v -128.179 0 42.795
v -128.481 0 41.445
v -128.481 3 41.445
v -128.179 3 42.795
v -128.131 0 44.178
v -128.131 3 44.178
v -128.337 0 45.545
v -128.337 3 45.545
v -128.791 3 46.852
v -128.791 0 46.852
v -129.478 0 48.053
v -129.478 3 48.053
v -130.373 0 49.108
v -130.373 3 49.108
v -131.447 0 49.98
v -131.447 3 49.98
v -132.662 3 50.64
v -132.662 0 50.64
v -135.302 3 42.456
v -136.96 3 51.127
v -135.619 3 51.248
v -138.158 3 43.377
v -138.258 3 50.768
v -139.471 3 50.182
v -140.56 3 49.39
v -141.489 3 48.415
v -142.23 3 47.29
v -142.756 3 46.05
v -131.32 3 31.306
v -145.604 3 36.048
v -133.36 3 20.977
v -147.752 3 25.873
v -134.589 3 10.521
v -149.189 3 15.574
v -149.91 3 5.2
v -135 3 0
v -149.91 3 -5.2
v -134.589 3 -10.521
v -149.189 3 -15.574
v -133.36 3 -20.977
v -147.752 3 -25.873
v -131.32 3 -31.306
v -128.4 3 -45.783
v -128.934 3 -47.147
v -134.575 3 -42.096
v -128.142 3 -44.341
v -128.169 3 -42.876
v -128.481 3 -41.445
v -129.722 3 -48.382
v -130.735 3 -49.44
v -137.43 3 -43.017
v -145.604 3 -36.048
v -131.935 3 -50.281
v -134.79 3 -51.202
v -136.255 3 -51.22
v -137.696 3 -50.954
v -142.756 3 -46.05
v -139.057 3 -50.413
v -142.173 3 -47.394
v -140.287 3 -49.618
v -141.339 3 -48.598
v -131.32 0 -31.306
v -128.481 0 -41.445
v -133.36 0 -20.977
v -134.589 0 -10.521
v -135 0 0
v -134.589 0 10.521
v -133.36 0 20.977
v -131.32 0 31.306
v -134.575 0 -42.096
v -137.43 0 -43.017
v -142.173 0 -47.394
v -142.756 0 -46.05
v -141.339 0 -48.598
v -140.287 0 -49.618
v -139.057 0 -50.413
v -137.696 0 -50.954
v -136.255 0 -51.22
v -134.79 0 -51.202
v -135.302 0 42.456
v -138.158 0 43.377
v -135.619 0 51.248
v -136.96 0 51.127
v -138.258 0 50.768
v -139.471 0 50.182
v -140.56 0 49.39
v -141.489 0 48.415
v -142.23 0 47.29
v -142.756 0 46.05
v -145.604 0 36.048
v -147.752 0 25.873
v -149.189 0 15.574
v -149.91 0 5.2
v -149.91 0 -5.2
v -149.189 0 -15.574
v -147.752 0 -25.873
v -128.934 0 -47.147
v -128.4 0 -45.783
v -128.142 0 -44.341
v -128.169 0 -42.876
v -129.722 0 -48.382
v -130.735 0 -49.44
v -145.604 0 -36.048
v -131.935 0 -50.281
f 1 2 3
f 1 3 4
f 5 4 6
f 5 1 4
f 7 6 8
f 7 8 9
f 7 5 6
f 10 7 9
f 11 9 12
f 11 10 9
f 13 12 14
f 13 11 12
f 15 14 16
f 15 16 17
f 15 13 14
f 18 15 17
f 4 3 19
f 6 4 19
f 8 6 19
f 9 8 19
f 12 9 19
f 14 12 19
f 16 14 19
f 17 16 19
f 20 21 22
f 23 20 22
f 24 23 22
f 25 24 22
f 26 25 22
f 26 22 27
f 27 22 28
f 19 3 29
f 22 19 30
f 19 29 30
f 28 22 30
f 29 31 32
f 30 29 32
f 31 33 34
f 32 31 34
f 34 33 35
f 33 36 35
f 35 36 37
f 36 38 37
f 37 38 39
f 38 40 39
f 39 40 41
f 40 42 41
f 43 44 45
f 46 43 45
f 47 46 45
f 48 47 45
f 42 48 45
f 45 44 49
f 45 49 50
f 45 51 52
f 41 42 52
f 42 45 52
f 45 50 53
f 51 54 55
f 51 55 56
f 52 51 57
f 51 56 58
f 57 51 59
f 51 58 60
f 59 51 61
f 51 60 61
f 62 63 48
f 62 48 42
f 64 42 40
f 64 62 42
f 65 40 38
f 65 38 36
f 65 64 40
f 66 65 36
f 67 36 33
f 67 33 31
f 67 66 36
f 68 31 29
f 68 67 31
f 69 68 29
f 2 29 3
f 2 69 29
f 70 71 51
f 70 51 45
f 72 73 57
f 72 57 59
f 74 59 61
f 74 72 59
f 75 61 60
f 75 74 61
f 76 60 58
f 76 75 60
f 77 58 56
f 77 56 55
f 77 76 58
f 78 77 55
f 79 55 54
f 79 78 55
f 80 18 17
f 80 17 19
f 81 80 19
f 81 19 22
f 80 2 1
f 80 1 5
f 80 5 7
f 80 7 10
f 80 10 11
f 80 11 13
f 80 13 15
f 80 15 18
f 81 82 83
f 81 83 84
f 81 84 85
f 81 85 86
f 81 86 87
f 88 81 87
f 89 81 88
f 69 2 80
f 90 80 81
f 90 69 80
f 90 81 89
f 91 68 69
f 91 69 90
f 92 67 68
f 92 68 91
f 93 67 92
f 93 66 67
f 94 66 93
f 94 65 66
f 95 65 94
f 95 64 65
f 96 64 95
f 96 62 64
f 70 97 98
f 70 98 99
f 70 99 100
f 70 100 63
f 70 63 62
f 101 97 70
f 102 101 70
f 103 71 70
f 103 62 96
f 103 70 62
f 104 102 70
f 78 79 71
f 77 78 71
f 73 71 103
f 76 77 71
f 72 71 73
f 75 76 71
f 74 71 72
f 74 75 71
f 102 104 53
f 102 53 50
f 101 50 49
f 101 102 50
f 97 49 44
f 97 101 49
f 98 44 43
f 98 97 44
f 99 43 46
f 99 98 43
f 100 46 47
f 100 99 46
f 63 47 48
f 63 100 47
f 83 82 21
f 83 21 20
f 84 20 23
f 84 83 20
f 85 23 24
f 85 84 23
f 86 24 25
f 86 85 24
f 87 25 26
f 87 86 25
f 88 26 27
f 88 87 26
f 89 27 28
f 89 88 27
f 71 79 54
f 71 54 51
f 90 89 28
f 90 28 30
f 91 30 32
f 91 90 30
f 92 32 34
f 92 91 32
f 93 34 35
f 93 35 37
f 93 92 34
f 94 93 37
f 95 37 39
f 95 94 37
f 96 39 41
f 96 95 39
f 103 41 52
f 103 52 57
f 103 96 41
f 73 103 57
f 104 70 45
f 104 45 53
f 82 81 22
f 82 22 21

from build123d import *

# Parameters (mm, degrees)
SALIENTE_EXTRUIR1_DEPTH = 3


with BuildPart() as part:
    # Croquis2 → Saliente-Extruir1 (new body)
    with BuildSketch(Plane(origin=(0, 0, 0), x_dir=(1, 0, 0), z_dir=(0, 1, 0))):
        with BuildLine():
            Line((-134.790190036, 51.201608082), (-137.430390036, 43.016906257))
            Line((-137.430390036, 43.016906257), (-134.575261492, 42.095906257))
            Line((-134.575261492, 42.095906257), (-131.935061492, 50.280608082))
            ThreePointArc((-131.935061492, 50.280608082), (-128.633444304, 46.478345774), (-128.480784458, 41.445))
            ThreePointArc((-128.480784458, 41.445), (-135, 0), (-128.480784458, -41.445))
            ThreePointArc((-128.480784458, -41.445), (-128.791366857, -46.852143005), (-132.662267215, -50.640254317))
            Line((-132.662267215, -50.640254317), (-135.302467215, -42.455552492))
            Line((-135.302467215, -42.455552492), (-138.157595759, -43.376552492))
            Line((-138.157595759, -43.376552492), (-135.618605817, -51.2475))
            ThreePointArc((-135.618605817, -51.2475), (-140.033424613, -49.810451014), (-142.756427176, -46.05))
            ThreePointArc((-142.756427176, -46.05), (-150, 0), (-142.756427176, 46.05))
            ThreePointArc((-142.756427176, 46.05), (-139.691309605, 50.045363436), (-134.790190036, 51.201608082))
        make_face()
    extrude(amount=SALIENTE_EXTRUIR1_DEPTH)


solid = part.part
